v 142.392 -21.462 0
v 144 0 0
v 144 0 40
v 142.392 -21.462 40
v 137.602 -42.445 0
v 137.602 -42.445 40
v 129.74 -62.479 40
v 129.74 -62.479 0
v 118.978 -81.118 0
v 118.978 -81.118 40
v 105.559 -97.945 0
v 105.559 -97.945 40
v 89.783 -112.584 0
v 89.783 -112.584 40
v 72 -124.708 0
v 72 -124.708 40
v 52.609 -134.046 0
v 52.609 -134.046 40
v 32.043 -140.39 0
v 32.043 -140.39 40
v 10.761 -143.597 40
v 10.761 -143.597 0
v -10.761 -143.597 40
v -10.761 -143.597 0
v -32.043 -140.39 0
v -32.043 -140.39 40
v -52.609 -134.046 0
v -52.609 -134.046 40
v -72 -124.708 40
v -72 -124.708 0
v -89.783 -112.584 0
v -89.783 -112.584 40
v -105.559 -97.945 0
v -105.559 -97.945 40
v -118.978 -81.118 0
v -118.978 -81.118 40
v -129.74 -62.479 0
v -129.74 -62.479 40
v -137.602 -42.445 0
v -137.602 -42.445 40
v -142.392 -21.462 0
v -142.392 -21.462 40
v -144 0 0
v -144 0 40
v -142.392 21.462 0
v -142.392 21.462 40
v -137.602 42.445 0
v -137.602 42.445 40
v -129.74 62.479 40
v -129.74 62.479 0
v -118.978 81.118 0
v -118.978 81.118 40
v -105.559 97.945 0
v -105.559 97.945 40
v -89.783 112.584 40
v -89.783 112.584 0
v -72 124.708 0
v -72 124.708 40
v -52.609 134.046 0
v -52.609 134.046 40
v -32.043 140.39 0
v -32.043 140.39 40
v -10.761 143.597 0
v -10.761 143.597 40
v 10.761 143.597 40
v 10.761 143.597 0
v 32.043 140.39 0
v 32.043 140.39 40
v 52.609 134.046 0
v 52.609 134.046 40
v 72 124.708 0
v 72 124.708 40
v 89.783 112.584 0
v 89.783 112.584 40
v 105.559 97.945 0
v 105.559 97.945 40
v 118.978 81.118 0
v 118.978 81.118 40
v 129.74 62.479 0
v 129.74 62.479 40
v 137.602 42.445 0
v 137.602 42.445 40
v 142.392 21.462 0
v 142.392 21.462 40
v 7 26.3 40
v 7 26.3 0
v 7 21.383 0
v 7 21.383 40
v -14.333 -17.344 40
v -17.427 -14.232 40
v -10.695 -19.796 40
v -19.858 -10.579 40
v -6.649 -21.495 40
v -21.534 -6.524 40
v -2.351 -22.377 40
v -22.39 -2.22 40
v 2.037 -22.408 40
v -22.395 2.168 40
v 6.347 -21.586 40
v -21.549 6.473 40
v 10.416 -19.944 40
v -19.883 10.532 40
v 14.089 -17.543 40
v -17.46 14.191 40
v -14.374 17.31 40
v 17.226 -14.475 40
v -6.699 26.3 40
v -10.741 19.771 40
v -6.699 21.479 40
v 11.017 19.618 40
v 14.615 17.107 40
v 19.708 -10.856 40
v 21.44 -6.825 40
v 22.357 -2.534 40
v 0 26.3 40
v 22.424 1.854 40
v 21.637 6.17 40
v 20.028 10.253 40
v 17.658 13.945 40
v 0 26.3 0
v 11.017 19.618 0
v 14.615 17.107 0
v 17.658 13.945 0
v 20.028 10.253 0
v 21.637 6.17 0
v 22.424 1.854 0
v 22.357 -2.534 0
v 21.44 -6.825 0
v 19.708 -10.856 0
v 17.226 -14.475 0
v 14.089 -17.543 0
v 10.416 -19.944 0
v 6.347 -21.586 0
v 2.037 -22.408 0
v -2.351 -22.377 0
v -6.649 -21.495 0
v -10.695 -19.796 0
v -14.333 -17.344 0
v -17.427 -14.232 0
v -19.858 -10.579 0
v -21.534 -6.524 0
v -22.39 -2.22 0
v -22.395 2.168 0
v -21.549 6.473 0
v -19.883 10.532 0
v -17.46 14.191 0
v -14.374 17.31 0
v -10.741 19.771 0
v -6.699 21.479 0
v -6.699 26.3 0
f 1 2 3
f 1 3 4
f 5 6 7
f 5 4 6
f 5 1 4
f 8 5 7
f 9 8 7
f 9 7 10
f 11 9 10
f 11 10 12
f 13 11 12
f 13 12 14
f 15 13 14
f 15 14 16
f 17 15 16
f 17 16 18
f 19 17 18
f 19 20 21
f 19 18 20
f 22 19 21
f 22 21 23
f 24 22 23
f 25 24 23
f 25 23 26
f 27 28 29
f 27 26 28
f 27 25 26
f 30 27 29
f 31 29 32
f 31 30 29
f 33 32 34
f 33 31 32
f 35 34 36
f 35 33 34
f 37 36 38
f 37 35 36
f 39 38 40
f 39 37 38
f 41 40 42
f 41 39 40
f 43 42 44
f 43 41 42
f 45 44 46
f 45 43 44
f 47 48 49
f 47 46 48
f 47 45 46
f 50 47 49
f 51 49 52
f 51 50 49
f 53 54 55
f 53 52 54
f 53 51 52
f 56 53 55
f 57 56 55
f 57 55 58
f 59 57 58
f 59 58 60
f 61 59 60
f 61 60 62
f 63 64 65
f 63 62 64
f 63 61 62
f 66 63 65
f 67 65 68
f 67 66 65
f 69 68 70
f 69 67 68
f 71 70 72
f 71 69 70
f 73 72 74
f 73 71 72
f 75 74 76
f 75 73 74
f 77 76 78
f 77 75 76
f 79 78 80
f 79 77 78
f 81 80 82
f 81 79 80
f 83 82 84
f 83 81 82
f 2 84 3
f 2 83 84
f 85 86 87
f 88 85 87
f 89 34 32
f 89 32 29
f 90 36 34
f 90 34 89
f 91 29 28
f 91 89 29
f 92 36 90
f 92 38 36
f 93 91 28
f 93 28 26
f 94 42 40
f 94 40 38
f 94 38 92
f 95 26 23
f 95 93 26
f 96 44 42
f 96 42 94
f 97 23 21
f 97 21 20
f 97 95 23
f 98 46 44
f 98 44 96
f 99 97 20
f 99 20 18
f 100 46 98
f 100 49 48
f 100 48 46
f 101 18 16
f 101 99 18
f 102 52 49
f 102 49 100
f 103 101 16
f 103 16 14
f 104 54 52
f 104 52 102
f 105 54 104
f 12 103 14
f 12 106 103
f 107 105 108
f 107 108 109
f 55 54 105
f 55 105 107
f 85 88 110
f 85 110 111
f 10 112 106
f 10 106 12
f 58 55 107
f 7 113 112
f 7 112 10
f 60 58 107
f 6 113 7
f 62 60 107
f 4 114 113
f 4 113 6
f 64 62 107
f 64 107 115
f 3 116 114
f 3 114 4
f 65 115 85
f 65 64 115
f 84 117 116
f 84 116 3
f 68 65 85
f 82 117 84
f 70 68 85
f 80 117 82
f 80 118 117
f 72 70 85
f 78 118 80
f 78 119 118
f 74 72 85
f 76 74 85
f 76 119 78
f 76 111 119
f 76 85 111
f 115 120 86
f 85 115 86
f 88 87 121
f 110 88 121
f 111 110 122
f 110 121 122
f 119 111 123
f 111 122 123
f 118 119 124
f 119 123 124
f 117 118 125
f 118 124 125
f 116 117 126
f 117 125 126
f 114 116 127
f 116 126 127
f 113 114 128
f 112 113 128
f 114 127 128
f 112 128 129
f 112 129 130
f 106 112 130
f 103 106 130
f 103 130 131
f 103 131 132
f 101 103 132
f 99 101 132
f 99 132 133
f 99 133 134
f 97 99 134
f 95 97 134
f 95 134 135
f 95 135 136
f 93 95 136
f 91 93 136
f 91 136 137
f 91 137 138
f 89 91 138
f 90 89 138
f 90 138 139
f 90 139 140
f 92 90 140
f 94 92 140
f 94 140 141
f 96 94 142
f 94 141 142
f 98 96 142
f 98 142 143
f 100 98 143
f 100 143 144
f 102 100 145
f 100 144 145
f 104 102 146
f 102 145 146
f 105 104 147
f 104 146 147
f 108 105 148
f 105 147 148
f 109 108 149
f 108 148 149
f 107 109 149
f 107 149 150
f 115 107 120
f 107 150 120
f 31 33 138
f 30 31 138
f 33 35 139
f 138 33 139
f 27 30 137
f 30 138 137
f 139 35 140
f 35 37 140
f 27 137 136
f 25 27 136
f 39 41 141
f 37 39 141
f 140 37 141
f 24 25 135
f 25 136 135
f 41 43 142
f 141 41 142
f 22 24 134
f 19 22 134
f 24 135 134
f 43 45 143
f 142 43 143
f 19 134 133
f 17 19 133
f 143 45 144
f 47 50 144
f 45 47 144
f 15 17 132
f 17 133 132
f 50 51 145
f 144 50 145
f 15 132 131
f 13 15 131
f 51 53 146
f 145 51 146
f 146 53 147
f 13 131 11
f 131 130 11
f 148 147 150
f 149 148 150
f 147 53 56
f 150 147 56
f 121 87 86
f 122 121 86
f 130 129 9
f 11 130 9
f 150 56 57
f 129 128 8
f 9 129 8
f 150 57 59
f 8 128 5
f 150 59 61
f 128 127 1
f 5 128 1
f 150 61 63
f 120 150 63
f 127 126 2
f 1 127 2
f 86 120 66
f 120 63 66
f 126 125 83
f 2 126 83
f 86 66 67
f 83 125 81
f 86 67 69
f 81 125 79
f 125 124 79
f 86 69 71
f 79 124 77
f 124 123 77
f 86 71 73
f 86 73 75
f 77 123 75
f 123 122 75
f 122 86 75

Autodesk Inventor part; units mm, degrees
ref_plane "YZ Plane" through (0, 0, 0) normal (1, 0, 0) x (0, 1, 0)
ref_plane "XZ Plane" through (0, 0, 0) normal (0, 1, 0) x (-1, 0, 0)
ref_plane "XY Plane" through (0, 0, 0) normal (0, 0, 1) x (1, 0, 0)
sketch "スケッチ1" plane through (0, 0, 0) normal (0, 0, 1) x (1, 0, 0)
  circle A0 centre (0, 0) radius 144
  arc A1 (-6.699441, 21.479467) -> (7, 21.383405) centre (0, 0) ccw
  line L0 (0, 22.5) -> (0, 17)
  line L1 (0, 22.5) -> (0, 26.3)
  line L2 (0, 26.3) -> (7, 26.3)
  line L3 (7, 26.3) -> (7, 21.383405)
  line L4 (7, 17) -> (0, 17)
  line L5 (-6.699441, 21.479467) -> (-6.699441, 26.3)
  line L6 (-6.699441, 26.3) -> (0, 26.3)
  circle A2 centre (0, 0) radius 135 construction
  circle A3 centre (0, 0) radius 131.55695 construction
  circle A4 centre (0, 0) radius 140 construction
  line L7 (0, 0) -> (139.964753, 3.141329)
  line L8 (0, 0) -> (140, 0) construction
  line L9 (0, 0) -> (134.981058, 2.261433)
  arc A5 (131.55695, 0) -> (131.538491, 2.203757) centre (0, 0) ccw
  line L10 (150.184159, 7.263201) -> (152.050707, -0.299145)
  line L11 (119.584335, 0) -> (125.15167, 0)
  circle A6 centre (0, 0) radius 131.55695 construction
  line L12 (0, 0) -> (134.981058, -2.261433)
  line L13 (150.184159, -7.263201) -> (152.050707, 0.299145)
  arc A7 (131.538491, -2.203757) -> (131.55695, 0) centre (0, 0) ccw
  line L14 (143.93152, 4.440455) -> (146.480822, 0.114106)
  line L15 (146.480822, 0.114106) -> (143.93152, -4.440455)
  line L16 (134.979291, 2.261403) -> (134.981058, 2.261433)
  line L17 (134.907008, -2.260192) -> (135.074128, -2.262992)
  line L18 (143.93152, -4.440455) -> (144.436873, -3.537595)
  line L19 (143.93152, 4.440455) -> (145.266584, 2.433754)
  line L20 (145.266584, 2.433754) -> (146.480822, 0.114106)
  line L21 (131.538491, 2.203757) -> (134.981058, 2.261433)
  line L22 (131.538491, -2.203757) -> (135.074128, -2.262992)
  line L23 (131.570586, -2.204295) -> (131.538491, -2.203757)
  arc A8 (131.538491, -2.203757) -> (131.538491, -2.203757) centre (131.538491, -2.203757) ccw
  line L24 (131.7018, 2.206493) -> (131.538491, 2.203757)
  dimension "d7" = 270
  dimension "d9" = 280
  dimension "d0" = 288
  dimension "d1" = 45
  dimension "d2" = 5.5
  dimension "d3" = 3.8
  dimension "d4" = 7
  dimension "d8" = 263.1139
  dimension "d18" = 1.28571
  dimension "d19" = 0
sketch "スケッチ1 outline for 押し出し1" plane through (0, 0, 0) normal (0, 0, 1) x (1, 0, 0)
  circle A0 centre (0, 0) radius 144
  line L0 (0, 26.3) -> (7, 26.3)
  line L1 (-6.699441, 26.3) -> (0, 26.3)
  line L2 (-6.699441, 21.479467) -> (-6.699441, 26.3)
  arc A1 (7, 21.383405) -> (-6.699441, 21.479467) centre (0, 0) cw
  line L3 (7, 26.3) -> (7, 21.383405)
extrude "押し出し1" add sketch "スケッチ1 outline for 押し出し1" along normal blind 40
sketch "スケッチ2" plane through (0, 0, 0) normal (0, 0, -1) x (-1, 0, 0)
  point P0 (0, 0)
properties part number "gear2"
